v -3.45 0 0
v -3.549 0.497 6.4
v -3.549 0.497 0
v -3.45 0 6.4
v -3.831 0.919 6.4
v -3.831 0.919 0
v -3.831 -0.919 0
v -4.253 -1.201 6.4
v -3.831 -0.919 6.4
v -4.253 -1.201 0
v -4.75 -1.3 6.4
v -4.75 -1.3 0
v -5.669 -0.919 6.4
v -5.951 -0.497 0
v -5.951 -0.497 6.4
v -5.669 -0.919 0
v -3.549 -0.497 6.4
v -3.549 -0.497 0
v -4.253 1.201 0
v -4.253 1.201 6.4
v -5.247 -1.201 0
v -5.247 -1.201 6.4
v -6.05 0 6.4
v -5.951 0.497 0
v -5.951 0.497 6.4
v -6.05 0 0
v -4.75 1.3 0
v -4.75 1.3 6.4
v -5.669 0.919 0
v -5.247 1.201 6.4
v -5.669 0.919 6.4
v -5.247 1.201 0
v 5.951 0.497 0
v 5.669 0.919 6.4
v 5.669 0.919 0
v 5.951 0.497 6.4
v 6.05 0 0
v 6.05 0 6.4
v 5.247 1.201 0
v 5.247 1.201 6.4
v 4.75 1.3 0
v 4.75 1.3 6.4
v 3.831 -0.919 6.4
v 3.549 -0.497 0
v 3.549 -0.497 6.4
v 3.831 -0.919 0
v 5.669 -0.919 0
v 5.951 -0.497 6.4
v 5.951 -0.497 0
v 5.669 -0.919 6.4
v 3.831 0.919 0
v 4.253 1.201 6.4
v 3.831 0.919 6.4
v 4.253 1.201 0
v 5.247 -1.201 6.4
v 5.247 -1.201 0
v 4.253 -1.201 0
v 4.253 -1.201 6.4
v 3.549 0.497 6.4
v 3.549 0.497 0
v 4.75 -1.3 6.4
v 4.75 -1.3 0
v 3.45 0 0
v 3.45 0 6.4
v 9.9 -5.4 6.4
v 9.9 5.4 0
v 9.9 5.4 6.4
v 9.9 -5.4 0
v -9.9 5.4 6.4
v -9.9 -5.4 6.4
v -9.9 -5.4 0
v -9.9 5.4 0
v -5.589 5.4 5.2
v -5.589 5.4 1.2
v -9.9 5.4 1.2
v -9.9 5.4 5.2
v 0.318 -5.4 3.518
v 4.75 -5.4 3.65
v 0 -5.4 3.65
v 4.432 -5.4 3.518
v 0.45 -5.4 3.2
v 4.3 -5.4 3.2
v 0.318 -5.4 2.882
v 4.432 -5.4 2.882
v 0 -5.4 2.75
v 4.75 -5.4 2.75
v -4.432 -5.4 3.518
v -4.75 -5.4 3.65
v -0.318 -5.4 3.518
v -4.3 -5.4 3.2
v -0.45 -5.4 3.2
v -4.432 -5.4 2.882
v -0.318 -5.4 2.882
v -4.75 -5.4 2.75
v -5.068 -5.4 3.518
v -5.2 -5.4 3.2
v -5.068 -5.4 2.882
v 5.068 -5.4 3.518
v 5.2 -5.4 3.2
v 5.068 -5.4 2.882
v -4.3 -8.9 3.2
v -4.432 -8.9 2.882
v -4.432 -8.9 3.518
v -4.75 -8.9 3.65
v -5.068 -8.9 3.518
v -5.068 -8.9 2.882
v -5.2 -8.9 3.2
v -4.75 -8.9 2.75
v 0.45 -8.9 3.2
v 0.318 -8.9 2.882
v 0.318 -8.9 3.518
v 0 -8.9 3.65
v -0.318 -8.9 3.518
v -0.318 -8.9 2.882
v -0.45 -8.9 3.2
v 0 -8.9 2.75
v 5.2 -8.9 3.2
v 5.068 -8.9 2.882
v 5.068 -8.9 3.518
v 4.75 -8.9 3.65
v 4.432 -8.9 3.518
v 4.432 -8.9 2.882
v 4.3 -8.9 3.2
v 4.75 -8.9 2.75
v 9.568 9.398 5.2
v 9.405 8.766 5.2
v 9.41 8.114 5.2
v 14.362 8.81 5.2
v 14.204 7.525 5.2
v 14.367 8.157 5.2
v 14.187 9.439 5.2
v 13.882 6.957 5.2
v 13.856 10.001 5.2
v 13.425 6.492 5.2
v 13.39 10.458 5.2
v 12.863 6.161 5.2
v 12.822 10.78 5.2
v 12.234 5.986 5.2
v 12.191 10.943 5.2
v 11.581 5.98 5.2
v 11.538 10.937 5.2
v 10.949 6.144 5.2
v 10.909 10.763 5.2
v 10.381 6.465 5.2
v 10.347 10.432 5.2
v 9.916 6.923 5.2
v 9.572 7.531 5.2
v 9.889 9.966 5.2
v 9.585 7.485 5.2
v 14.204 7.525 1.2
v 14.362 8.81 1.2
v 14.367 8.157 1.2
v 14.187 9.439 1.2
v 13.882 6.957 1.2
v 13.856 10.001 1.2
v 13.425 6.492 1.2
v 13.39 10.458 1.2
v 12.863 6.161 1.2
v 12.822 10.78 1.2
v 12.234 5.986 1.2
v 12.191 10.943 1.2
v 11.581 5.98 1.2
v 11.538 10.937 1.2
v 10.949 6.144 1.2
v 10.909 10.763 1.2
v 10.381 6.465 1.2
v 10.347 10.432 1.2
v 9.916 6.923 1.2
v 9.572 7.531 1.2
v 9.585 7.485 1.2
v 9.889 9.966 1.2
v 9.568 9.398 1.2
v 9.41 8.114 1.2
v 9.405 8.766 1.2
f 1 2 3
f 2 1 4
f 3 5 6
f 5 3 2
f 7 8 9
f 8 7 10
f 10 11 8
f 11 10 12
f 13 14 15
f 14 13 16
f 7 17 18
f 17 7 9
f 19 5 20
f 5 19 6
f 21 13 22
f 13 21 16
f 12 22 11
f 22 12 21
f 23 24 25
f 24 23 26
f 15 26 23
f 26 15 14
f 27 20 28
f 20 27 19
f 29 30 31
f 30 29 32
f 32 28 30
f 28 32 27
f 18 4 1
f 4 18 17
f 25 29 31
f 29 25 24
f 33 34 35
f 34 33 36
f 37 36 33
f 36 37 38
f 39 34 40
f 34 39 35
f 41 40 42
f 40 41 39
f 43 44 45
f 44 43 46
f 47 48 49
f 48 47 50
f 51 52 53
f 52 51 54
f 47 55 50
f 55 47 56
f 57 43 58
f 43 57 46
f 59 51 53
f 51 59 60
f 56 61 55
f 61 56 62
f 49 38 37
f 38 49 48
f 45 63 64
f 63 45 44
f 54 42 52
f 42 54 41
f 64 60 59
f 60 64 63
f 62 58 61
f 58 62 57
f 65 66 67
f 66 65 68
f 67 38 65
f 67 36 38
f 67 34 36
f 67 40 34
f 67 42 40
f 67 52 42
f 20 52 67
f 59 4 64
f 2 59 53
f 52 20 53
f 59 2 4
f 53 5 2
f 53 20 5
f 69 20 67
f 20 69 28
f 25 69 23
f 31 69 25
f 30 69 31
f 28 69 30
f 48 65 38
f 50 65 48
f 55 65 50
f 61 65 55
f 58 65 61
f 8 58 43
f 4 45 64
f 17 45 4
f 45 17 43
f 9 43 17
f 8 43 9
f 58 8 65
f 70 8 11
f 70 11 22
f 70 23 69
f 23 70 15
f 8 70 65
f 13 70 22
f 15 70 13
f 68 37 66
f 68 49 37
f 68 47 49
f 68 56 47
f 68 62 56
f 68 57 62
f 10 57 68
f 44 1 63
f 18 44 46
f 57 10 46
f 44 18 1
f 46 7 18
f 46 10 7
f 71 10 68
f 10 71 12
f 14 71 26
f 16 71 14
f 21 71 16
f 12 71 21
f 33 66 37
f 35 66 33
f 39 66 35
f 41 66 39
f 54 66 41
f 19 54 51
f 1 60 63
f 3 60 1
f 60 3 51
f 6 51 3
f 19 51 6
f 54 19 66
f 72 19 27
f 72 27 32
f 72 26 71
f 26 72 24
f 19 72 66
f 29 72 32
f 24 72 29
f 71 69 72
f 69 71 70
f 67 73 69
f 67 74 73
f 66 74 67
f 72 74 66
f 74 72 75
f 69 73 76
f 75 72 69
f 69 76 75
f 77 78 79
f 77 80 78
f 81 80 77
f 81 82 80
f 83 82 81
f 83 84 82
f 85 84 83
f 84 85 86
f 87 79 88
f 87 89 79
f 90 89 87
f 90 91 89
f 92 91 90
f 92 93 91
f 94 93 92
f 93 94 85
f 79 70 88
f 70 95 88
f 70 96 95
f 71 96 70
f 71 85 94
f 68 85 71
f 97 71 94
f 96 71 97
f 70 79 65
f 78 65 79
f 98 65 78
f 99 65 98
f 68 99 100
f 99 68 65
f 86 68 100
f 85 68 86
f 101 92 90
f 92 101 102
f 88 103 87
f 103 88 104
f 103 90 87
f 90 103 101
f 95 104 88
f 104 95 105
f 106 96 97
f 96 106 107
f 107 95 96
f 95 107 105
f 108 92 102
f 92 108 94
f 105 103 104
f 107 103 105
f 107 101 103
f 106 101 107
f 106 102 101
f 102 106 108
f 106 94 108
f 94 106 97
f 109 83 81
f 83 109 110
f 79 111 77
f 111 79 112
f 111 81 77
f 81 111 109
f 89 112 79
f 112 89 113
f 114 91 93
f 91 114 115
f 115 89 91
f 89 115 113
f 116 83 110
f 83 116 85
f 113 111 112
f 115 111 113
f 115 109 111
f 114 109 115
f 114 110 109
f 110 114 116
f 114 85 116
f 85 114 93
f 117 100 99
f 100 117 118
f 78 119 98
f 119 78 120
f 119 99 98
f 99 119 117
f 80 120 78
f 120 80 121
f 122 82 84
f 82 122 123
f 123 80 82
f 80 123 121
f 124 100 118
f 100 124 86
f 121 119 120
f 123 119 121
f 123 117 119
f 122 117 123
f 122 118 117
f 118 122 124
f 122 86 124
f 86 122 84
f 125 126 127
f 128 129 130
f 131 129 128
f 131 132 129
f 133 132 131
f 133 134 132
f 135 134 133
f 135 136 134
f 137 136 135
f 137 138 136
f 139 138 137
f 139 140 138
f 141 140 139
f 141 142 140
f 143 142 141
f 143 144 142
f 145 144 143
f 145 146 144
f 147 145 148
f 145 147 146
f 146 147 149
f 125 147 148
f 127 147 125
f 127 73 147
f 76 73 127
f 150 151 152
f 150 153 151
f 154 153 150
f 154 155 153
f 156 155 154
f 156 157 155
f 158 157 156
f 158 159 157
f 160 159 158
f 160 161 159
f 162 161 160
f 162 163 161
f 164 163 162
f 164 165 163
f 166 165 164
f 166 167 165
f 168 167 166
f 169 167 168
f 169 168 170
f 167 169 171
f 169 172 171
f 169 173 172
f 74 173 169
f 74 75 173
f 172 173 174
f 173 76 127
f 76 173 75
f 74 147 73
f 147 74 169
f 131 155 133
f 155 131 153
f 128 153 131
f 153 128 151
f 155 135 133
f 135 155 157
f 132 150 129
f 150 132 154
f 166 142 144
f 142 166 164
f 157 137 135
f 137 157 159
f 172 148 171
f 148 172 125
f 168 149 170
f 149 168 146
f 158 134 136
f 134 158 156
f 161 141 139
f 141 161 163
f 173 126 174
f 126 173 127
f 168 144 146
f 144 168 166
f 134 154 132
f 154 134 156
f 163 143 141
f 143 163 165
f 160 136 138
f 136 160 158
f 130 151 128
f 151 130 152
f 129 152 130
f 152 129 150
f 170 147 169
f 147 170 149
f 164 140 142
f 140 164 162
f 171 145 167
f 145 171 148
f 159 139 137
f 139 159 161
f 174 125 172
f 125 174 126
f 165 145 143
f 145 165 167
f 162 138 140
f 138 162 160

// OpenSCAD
// 용어
// 1. 리미트 스위치(limit switch)
// 2. 비타민 목업(vitamin mockup)
// 3. 장착홀 피치(mounting hole pitch)
// 4. 단자 피치(terminal pitch)
// 5. 레버 스트립(lever strip)
// 6. 롤러(roller)

// KW12 기계식 부품의 외형 검토용 모델입니다.
// 원점은 본체 바닥 면적 중심이고 Z는 본체 바닥에서 시작합니다.

$fa = 6;
$fs = 0.6;

// 치수 배열 순서: [길이, 높이, 두께] (mm).
function kw12_limit_switch_body_size() = [19.8, 10.8, 6.4];

module _kw12_body(size, hole_pitch, hole_d, part_color) {
    length = size[0];
    height = size[1];
    thickness = size[2];
    eps = 0.1;

    assert(length > 0, "KW12 본체 길이(length)는 양수여야 합니다");
    assert(height > 0, "KW12 본체 높이(height)는 양수여야 합니다");
    assert(thickness > 0, "KW12 본체 두께(thickness)는 양수여야 합니다");
    assert(hole_pitch > 0, "KW12 장착홀 피치(hole_pitch)는 양수여야 합니다");
    assert(hole_d > 0, "KW12 장착홀 지름(hole_d)은 양수여야 합니다");

    color(part_color)
        translate([-length / 2, -height / 2, 0])
            difference() {
                cube(size);
                for (x = [-hole_pitch / 2, hole_pitch / 2])
                    translate([length / 2 + x, height / 2, -eps])
                        cylinder(d = hole_d, h = thickness + 2 * eps, $fn = 16);
            }
}

module _kw12_terminals(size, terminal_pitch, terminal_d, terminal_len, part_color) {
    height = size[1];
    thickness = size[2];

    assert(terminal_pitch > 0, "KW12 단자 피치(terminal_pitch)는 양수여야 합니다");
    assert(terminal_d > 0, "KW12 단자 지름(terminal_d)은 양수여야 합니다");
    assert(terminal_len > 0, "KW12 단자 길이(terminal_len)는 양수여야 합니다");

    color(part_color)
        for (x = [-terminal_pitch / 2, 0, terminal_pitch / 2])
            translate([x, -height / 2, thickness / 2])
                rotate([90, 0, 0])
                    cylinder(d = terminal_d, h = terminal_len, $fn = 8);
}

module _kw12_lever(size, lever_len, lever_rise, strip_w, strip_h, roller_d, roller_w, part_color) {
    length = size[0];
    height = size[1];
    thickness = size[2];
    lever_anchor = [-length / 2, height / 2, thickness / 2];
    strip_corner = [0, -strip_w, -strip_h / 2];

    assert(lever_len > 0, "KW12 레버 길이(lever_len)는 양수여야 합니다");
    assert(strip_w > 0, "KW12 레버 스트립 폭(strip_w)은 양수여야 합니다");
    assert(strip_h > 0, "KW12 레버 스트립 높이(strip_h)는 양수여야 합니다");
    assert(roller_d > 0, "KW12 롤러 지름(roller_d)은 양수여야 합니다");
    assert(roller_w > 0, "KW12 롤러 폭(roller_w)은 양수여야 합니다");

    color(part_color)
        translate(lever_anchor)
            rotate([0, 0, lever_rise]) {
                translate(strip_corner)
                    cube([lever_len, strip_w, strip_h]);
                translate([lever_len, 0, 0])
                    cylinder(d = roller_d, h = roller_w, center = true, $fn = 24);
            }
}

module kw12_limit_switch(body_color = "#1f2933", lever_color = "#c4ccd4", pin_color = "#c8a23c") {
    body = kw12_limit_switch_body_size();

    mount_hole_pitch = 9.5;
    mount_hole_d = 2.6;

    terminal_pitch = 9.5;
    terminal_d = 0.9;
    terminal_len = 3.5;

    lever_len = 22;
    lever_rise = 8;
    strip_w = 0.6;
    strip_h = 4;
    roller_d = 5;
    roller_w = 4;

    _kw12_body(size = body,
               hole_pitch = mount_hole_pitch,
               hole_d = mount_hole_d,
               part_color = body_color);
    _kw12_terminals(size = body,
                    terminal_pitch = terminal_pitch,
                    terminal_d = terminal_d,
                    terminal_len = terminal_len,
                    part_color = pin_color);
    _kw12_lever(size = body,
                lever_len = lever_len,
                lever_rise = lever_rise,
                strip_w = strip_w,
                strip_h = strip_h,
                roller_d = roller_d,
                roller_w = roller_w,
                part_color = lever_color);
}

kw12_limit_switch();
